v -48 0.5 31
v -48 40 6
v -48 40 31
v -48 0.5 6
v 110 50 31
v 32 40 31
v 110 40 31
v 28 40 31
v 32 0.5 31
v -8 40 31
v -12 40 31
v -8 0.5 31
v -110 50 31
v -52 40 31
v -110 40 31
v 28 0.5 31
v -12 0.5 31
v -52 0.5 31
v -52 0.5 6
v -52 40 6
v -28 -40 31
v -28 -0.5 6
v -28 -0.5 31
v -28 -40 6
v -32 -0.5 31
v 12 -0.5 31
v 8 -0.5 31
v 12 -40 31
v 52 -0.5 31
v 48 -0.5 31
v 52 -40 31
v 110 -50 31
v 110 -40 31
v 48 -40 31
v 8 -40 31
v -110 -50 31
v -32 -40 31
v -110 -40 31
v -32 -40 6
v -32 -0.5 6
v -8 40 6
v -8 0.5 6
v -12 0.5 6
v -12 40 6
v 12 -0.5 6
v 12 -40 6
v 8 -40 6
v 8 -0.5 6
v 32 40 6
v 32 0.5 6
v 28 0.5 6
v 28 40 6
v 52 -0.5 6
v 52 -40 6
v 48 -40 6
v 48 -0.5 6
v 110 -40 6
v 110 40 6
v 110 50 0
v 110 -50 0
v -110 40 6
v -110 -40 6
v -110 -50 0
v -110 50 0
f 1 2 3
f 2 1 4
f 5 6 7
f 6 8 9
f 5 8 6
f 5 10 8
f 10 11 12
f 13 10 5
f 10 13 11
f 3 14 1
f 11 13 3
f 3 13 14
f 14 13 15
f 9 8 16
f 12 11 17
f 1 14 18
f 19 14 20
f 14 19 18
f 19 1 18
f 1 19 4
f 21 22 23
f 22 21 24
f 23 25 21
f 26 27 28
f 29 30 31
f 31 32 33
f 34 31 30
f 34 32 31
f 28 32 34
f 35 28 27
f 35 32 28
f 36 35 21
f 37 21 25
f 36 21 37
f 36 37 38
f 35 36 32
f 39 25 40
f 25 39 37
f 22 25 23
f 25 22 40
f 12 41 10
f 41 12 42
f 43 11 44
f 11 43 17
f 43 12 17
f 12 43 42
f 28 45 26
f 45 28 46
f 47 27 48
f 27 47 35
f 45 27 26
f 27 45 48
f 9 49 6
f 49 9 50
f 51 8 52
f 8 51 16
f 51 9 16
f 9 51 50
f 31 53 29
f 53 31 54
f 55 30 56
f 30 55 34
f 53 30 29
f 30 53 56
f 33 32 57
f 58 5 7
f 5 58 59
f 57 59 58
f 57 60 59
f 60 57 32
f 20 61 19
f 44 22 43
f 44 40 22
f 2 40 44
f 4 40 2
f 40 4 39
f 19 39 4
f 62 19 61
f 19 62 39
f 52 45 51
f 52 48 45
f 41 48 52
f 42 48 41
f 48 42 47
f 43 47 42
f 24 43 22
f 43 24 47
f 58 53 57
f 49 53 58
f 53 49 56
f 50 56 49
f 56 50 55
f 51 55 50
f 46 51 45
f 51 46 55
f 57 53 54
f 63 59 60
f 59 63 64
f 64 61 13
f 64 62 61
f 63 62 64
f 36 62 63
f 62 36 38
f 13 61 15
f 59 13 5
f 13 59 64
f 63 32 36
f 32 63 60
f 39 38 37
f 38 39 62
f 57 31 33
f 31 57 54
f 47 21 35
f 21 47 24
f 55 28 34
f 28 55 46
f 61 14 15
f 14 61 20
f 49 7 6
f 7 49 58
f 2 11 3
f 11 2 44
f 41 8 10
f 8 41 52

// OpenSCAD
$fn = 32;

// ----------------------------------------------------------------------
// Rib frame 220 x 100 x 31
// 6 ribs at 20 mm pitch, staggered
// ----------------------------------------------------------------------

// --- parameters (mm) ---
frame = [220, 100, 6];  // base plate size (x, y, z)
rail_w = 10;            // side rail width
ribs = 6;               // number of ribs
rib_t = 4;              // rib thickness
rib_h = 25;             // rib height above the base plate
pitch = 20;             // pitch between rib centres

// --- derived feature positions (mm) ---
span = (ribs - 1) * pitch;          // = 100   distance between the outer ribs
origin_x = -span / 2;               // = -50   X of the first rib
rib_len = frame[1] / 2 - rail_w + 0.5;  // = 40.5   length of a staggered rib
rib_y = 0.5 + rib_len / 2;          // = 20.75   Y of a staggered rib centre
row_offset = 2 * rib_y;             // = 41.5   distance between the two rows
feature_centers = [
  [origin_x + 0 * pitch, rib_y],
  [origin_x + 1 * pitch, -rib_y],
  [origin_x + 2 * pitch, rib_y],
  [origin_x + 3 * pitch, -rib_y],
  [origin_x + 4 * pitch, rib_y],
  [origin_x + 5 * pitch, -rib_y]
];   // rib centre line, drives the rib loop

// base plate, two side rails, then the ribs read straight off feature_centers
union() {
  translate([-frame[0] / 2, -frame[1] / 2, 0]) cube(frame);
  translate([-frame[0] / 2, -frame[1] / 2, 0]) cube([frame[0], rail_w, frame[2] + rib_h]);
  translate([-frame[0] / 2, frame[1] / 2 - rail_w, 0]) cube([frame[0], rail_w, frame[2] + rib_h]);
  for (centre = feature_centers)
    translate([centre[0] - rib_t / 2, centre[1] - rib_len / 2, frame[2] - 1])
      cube([rib_t, rib_len, rib_h + 1]);
}
